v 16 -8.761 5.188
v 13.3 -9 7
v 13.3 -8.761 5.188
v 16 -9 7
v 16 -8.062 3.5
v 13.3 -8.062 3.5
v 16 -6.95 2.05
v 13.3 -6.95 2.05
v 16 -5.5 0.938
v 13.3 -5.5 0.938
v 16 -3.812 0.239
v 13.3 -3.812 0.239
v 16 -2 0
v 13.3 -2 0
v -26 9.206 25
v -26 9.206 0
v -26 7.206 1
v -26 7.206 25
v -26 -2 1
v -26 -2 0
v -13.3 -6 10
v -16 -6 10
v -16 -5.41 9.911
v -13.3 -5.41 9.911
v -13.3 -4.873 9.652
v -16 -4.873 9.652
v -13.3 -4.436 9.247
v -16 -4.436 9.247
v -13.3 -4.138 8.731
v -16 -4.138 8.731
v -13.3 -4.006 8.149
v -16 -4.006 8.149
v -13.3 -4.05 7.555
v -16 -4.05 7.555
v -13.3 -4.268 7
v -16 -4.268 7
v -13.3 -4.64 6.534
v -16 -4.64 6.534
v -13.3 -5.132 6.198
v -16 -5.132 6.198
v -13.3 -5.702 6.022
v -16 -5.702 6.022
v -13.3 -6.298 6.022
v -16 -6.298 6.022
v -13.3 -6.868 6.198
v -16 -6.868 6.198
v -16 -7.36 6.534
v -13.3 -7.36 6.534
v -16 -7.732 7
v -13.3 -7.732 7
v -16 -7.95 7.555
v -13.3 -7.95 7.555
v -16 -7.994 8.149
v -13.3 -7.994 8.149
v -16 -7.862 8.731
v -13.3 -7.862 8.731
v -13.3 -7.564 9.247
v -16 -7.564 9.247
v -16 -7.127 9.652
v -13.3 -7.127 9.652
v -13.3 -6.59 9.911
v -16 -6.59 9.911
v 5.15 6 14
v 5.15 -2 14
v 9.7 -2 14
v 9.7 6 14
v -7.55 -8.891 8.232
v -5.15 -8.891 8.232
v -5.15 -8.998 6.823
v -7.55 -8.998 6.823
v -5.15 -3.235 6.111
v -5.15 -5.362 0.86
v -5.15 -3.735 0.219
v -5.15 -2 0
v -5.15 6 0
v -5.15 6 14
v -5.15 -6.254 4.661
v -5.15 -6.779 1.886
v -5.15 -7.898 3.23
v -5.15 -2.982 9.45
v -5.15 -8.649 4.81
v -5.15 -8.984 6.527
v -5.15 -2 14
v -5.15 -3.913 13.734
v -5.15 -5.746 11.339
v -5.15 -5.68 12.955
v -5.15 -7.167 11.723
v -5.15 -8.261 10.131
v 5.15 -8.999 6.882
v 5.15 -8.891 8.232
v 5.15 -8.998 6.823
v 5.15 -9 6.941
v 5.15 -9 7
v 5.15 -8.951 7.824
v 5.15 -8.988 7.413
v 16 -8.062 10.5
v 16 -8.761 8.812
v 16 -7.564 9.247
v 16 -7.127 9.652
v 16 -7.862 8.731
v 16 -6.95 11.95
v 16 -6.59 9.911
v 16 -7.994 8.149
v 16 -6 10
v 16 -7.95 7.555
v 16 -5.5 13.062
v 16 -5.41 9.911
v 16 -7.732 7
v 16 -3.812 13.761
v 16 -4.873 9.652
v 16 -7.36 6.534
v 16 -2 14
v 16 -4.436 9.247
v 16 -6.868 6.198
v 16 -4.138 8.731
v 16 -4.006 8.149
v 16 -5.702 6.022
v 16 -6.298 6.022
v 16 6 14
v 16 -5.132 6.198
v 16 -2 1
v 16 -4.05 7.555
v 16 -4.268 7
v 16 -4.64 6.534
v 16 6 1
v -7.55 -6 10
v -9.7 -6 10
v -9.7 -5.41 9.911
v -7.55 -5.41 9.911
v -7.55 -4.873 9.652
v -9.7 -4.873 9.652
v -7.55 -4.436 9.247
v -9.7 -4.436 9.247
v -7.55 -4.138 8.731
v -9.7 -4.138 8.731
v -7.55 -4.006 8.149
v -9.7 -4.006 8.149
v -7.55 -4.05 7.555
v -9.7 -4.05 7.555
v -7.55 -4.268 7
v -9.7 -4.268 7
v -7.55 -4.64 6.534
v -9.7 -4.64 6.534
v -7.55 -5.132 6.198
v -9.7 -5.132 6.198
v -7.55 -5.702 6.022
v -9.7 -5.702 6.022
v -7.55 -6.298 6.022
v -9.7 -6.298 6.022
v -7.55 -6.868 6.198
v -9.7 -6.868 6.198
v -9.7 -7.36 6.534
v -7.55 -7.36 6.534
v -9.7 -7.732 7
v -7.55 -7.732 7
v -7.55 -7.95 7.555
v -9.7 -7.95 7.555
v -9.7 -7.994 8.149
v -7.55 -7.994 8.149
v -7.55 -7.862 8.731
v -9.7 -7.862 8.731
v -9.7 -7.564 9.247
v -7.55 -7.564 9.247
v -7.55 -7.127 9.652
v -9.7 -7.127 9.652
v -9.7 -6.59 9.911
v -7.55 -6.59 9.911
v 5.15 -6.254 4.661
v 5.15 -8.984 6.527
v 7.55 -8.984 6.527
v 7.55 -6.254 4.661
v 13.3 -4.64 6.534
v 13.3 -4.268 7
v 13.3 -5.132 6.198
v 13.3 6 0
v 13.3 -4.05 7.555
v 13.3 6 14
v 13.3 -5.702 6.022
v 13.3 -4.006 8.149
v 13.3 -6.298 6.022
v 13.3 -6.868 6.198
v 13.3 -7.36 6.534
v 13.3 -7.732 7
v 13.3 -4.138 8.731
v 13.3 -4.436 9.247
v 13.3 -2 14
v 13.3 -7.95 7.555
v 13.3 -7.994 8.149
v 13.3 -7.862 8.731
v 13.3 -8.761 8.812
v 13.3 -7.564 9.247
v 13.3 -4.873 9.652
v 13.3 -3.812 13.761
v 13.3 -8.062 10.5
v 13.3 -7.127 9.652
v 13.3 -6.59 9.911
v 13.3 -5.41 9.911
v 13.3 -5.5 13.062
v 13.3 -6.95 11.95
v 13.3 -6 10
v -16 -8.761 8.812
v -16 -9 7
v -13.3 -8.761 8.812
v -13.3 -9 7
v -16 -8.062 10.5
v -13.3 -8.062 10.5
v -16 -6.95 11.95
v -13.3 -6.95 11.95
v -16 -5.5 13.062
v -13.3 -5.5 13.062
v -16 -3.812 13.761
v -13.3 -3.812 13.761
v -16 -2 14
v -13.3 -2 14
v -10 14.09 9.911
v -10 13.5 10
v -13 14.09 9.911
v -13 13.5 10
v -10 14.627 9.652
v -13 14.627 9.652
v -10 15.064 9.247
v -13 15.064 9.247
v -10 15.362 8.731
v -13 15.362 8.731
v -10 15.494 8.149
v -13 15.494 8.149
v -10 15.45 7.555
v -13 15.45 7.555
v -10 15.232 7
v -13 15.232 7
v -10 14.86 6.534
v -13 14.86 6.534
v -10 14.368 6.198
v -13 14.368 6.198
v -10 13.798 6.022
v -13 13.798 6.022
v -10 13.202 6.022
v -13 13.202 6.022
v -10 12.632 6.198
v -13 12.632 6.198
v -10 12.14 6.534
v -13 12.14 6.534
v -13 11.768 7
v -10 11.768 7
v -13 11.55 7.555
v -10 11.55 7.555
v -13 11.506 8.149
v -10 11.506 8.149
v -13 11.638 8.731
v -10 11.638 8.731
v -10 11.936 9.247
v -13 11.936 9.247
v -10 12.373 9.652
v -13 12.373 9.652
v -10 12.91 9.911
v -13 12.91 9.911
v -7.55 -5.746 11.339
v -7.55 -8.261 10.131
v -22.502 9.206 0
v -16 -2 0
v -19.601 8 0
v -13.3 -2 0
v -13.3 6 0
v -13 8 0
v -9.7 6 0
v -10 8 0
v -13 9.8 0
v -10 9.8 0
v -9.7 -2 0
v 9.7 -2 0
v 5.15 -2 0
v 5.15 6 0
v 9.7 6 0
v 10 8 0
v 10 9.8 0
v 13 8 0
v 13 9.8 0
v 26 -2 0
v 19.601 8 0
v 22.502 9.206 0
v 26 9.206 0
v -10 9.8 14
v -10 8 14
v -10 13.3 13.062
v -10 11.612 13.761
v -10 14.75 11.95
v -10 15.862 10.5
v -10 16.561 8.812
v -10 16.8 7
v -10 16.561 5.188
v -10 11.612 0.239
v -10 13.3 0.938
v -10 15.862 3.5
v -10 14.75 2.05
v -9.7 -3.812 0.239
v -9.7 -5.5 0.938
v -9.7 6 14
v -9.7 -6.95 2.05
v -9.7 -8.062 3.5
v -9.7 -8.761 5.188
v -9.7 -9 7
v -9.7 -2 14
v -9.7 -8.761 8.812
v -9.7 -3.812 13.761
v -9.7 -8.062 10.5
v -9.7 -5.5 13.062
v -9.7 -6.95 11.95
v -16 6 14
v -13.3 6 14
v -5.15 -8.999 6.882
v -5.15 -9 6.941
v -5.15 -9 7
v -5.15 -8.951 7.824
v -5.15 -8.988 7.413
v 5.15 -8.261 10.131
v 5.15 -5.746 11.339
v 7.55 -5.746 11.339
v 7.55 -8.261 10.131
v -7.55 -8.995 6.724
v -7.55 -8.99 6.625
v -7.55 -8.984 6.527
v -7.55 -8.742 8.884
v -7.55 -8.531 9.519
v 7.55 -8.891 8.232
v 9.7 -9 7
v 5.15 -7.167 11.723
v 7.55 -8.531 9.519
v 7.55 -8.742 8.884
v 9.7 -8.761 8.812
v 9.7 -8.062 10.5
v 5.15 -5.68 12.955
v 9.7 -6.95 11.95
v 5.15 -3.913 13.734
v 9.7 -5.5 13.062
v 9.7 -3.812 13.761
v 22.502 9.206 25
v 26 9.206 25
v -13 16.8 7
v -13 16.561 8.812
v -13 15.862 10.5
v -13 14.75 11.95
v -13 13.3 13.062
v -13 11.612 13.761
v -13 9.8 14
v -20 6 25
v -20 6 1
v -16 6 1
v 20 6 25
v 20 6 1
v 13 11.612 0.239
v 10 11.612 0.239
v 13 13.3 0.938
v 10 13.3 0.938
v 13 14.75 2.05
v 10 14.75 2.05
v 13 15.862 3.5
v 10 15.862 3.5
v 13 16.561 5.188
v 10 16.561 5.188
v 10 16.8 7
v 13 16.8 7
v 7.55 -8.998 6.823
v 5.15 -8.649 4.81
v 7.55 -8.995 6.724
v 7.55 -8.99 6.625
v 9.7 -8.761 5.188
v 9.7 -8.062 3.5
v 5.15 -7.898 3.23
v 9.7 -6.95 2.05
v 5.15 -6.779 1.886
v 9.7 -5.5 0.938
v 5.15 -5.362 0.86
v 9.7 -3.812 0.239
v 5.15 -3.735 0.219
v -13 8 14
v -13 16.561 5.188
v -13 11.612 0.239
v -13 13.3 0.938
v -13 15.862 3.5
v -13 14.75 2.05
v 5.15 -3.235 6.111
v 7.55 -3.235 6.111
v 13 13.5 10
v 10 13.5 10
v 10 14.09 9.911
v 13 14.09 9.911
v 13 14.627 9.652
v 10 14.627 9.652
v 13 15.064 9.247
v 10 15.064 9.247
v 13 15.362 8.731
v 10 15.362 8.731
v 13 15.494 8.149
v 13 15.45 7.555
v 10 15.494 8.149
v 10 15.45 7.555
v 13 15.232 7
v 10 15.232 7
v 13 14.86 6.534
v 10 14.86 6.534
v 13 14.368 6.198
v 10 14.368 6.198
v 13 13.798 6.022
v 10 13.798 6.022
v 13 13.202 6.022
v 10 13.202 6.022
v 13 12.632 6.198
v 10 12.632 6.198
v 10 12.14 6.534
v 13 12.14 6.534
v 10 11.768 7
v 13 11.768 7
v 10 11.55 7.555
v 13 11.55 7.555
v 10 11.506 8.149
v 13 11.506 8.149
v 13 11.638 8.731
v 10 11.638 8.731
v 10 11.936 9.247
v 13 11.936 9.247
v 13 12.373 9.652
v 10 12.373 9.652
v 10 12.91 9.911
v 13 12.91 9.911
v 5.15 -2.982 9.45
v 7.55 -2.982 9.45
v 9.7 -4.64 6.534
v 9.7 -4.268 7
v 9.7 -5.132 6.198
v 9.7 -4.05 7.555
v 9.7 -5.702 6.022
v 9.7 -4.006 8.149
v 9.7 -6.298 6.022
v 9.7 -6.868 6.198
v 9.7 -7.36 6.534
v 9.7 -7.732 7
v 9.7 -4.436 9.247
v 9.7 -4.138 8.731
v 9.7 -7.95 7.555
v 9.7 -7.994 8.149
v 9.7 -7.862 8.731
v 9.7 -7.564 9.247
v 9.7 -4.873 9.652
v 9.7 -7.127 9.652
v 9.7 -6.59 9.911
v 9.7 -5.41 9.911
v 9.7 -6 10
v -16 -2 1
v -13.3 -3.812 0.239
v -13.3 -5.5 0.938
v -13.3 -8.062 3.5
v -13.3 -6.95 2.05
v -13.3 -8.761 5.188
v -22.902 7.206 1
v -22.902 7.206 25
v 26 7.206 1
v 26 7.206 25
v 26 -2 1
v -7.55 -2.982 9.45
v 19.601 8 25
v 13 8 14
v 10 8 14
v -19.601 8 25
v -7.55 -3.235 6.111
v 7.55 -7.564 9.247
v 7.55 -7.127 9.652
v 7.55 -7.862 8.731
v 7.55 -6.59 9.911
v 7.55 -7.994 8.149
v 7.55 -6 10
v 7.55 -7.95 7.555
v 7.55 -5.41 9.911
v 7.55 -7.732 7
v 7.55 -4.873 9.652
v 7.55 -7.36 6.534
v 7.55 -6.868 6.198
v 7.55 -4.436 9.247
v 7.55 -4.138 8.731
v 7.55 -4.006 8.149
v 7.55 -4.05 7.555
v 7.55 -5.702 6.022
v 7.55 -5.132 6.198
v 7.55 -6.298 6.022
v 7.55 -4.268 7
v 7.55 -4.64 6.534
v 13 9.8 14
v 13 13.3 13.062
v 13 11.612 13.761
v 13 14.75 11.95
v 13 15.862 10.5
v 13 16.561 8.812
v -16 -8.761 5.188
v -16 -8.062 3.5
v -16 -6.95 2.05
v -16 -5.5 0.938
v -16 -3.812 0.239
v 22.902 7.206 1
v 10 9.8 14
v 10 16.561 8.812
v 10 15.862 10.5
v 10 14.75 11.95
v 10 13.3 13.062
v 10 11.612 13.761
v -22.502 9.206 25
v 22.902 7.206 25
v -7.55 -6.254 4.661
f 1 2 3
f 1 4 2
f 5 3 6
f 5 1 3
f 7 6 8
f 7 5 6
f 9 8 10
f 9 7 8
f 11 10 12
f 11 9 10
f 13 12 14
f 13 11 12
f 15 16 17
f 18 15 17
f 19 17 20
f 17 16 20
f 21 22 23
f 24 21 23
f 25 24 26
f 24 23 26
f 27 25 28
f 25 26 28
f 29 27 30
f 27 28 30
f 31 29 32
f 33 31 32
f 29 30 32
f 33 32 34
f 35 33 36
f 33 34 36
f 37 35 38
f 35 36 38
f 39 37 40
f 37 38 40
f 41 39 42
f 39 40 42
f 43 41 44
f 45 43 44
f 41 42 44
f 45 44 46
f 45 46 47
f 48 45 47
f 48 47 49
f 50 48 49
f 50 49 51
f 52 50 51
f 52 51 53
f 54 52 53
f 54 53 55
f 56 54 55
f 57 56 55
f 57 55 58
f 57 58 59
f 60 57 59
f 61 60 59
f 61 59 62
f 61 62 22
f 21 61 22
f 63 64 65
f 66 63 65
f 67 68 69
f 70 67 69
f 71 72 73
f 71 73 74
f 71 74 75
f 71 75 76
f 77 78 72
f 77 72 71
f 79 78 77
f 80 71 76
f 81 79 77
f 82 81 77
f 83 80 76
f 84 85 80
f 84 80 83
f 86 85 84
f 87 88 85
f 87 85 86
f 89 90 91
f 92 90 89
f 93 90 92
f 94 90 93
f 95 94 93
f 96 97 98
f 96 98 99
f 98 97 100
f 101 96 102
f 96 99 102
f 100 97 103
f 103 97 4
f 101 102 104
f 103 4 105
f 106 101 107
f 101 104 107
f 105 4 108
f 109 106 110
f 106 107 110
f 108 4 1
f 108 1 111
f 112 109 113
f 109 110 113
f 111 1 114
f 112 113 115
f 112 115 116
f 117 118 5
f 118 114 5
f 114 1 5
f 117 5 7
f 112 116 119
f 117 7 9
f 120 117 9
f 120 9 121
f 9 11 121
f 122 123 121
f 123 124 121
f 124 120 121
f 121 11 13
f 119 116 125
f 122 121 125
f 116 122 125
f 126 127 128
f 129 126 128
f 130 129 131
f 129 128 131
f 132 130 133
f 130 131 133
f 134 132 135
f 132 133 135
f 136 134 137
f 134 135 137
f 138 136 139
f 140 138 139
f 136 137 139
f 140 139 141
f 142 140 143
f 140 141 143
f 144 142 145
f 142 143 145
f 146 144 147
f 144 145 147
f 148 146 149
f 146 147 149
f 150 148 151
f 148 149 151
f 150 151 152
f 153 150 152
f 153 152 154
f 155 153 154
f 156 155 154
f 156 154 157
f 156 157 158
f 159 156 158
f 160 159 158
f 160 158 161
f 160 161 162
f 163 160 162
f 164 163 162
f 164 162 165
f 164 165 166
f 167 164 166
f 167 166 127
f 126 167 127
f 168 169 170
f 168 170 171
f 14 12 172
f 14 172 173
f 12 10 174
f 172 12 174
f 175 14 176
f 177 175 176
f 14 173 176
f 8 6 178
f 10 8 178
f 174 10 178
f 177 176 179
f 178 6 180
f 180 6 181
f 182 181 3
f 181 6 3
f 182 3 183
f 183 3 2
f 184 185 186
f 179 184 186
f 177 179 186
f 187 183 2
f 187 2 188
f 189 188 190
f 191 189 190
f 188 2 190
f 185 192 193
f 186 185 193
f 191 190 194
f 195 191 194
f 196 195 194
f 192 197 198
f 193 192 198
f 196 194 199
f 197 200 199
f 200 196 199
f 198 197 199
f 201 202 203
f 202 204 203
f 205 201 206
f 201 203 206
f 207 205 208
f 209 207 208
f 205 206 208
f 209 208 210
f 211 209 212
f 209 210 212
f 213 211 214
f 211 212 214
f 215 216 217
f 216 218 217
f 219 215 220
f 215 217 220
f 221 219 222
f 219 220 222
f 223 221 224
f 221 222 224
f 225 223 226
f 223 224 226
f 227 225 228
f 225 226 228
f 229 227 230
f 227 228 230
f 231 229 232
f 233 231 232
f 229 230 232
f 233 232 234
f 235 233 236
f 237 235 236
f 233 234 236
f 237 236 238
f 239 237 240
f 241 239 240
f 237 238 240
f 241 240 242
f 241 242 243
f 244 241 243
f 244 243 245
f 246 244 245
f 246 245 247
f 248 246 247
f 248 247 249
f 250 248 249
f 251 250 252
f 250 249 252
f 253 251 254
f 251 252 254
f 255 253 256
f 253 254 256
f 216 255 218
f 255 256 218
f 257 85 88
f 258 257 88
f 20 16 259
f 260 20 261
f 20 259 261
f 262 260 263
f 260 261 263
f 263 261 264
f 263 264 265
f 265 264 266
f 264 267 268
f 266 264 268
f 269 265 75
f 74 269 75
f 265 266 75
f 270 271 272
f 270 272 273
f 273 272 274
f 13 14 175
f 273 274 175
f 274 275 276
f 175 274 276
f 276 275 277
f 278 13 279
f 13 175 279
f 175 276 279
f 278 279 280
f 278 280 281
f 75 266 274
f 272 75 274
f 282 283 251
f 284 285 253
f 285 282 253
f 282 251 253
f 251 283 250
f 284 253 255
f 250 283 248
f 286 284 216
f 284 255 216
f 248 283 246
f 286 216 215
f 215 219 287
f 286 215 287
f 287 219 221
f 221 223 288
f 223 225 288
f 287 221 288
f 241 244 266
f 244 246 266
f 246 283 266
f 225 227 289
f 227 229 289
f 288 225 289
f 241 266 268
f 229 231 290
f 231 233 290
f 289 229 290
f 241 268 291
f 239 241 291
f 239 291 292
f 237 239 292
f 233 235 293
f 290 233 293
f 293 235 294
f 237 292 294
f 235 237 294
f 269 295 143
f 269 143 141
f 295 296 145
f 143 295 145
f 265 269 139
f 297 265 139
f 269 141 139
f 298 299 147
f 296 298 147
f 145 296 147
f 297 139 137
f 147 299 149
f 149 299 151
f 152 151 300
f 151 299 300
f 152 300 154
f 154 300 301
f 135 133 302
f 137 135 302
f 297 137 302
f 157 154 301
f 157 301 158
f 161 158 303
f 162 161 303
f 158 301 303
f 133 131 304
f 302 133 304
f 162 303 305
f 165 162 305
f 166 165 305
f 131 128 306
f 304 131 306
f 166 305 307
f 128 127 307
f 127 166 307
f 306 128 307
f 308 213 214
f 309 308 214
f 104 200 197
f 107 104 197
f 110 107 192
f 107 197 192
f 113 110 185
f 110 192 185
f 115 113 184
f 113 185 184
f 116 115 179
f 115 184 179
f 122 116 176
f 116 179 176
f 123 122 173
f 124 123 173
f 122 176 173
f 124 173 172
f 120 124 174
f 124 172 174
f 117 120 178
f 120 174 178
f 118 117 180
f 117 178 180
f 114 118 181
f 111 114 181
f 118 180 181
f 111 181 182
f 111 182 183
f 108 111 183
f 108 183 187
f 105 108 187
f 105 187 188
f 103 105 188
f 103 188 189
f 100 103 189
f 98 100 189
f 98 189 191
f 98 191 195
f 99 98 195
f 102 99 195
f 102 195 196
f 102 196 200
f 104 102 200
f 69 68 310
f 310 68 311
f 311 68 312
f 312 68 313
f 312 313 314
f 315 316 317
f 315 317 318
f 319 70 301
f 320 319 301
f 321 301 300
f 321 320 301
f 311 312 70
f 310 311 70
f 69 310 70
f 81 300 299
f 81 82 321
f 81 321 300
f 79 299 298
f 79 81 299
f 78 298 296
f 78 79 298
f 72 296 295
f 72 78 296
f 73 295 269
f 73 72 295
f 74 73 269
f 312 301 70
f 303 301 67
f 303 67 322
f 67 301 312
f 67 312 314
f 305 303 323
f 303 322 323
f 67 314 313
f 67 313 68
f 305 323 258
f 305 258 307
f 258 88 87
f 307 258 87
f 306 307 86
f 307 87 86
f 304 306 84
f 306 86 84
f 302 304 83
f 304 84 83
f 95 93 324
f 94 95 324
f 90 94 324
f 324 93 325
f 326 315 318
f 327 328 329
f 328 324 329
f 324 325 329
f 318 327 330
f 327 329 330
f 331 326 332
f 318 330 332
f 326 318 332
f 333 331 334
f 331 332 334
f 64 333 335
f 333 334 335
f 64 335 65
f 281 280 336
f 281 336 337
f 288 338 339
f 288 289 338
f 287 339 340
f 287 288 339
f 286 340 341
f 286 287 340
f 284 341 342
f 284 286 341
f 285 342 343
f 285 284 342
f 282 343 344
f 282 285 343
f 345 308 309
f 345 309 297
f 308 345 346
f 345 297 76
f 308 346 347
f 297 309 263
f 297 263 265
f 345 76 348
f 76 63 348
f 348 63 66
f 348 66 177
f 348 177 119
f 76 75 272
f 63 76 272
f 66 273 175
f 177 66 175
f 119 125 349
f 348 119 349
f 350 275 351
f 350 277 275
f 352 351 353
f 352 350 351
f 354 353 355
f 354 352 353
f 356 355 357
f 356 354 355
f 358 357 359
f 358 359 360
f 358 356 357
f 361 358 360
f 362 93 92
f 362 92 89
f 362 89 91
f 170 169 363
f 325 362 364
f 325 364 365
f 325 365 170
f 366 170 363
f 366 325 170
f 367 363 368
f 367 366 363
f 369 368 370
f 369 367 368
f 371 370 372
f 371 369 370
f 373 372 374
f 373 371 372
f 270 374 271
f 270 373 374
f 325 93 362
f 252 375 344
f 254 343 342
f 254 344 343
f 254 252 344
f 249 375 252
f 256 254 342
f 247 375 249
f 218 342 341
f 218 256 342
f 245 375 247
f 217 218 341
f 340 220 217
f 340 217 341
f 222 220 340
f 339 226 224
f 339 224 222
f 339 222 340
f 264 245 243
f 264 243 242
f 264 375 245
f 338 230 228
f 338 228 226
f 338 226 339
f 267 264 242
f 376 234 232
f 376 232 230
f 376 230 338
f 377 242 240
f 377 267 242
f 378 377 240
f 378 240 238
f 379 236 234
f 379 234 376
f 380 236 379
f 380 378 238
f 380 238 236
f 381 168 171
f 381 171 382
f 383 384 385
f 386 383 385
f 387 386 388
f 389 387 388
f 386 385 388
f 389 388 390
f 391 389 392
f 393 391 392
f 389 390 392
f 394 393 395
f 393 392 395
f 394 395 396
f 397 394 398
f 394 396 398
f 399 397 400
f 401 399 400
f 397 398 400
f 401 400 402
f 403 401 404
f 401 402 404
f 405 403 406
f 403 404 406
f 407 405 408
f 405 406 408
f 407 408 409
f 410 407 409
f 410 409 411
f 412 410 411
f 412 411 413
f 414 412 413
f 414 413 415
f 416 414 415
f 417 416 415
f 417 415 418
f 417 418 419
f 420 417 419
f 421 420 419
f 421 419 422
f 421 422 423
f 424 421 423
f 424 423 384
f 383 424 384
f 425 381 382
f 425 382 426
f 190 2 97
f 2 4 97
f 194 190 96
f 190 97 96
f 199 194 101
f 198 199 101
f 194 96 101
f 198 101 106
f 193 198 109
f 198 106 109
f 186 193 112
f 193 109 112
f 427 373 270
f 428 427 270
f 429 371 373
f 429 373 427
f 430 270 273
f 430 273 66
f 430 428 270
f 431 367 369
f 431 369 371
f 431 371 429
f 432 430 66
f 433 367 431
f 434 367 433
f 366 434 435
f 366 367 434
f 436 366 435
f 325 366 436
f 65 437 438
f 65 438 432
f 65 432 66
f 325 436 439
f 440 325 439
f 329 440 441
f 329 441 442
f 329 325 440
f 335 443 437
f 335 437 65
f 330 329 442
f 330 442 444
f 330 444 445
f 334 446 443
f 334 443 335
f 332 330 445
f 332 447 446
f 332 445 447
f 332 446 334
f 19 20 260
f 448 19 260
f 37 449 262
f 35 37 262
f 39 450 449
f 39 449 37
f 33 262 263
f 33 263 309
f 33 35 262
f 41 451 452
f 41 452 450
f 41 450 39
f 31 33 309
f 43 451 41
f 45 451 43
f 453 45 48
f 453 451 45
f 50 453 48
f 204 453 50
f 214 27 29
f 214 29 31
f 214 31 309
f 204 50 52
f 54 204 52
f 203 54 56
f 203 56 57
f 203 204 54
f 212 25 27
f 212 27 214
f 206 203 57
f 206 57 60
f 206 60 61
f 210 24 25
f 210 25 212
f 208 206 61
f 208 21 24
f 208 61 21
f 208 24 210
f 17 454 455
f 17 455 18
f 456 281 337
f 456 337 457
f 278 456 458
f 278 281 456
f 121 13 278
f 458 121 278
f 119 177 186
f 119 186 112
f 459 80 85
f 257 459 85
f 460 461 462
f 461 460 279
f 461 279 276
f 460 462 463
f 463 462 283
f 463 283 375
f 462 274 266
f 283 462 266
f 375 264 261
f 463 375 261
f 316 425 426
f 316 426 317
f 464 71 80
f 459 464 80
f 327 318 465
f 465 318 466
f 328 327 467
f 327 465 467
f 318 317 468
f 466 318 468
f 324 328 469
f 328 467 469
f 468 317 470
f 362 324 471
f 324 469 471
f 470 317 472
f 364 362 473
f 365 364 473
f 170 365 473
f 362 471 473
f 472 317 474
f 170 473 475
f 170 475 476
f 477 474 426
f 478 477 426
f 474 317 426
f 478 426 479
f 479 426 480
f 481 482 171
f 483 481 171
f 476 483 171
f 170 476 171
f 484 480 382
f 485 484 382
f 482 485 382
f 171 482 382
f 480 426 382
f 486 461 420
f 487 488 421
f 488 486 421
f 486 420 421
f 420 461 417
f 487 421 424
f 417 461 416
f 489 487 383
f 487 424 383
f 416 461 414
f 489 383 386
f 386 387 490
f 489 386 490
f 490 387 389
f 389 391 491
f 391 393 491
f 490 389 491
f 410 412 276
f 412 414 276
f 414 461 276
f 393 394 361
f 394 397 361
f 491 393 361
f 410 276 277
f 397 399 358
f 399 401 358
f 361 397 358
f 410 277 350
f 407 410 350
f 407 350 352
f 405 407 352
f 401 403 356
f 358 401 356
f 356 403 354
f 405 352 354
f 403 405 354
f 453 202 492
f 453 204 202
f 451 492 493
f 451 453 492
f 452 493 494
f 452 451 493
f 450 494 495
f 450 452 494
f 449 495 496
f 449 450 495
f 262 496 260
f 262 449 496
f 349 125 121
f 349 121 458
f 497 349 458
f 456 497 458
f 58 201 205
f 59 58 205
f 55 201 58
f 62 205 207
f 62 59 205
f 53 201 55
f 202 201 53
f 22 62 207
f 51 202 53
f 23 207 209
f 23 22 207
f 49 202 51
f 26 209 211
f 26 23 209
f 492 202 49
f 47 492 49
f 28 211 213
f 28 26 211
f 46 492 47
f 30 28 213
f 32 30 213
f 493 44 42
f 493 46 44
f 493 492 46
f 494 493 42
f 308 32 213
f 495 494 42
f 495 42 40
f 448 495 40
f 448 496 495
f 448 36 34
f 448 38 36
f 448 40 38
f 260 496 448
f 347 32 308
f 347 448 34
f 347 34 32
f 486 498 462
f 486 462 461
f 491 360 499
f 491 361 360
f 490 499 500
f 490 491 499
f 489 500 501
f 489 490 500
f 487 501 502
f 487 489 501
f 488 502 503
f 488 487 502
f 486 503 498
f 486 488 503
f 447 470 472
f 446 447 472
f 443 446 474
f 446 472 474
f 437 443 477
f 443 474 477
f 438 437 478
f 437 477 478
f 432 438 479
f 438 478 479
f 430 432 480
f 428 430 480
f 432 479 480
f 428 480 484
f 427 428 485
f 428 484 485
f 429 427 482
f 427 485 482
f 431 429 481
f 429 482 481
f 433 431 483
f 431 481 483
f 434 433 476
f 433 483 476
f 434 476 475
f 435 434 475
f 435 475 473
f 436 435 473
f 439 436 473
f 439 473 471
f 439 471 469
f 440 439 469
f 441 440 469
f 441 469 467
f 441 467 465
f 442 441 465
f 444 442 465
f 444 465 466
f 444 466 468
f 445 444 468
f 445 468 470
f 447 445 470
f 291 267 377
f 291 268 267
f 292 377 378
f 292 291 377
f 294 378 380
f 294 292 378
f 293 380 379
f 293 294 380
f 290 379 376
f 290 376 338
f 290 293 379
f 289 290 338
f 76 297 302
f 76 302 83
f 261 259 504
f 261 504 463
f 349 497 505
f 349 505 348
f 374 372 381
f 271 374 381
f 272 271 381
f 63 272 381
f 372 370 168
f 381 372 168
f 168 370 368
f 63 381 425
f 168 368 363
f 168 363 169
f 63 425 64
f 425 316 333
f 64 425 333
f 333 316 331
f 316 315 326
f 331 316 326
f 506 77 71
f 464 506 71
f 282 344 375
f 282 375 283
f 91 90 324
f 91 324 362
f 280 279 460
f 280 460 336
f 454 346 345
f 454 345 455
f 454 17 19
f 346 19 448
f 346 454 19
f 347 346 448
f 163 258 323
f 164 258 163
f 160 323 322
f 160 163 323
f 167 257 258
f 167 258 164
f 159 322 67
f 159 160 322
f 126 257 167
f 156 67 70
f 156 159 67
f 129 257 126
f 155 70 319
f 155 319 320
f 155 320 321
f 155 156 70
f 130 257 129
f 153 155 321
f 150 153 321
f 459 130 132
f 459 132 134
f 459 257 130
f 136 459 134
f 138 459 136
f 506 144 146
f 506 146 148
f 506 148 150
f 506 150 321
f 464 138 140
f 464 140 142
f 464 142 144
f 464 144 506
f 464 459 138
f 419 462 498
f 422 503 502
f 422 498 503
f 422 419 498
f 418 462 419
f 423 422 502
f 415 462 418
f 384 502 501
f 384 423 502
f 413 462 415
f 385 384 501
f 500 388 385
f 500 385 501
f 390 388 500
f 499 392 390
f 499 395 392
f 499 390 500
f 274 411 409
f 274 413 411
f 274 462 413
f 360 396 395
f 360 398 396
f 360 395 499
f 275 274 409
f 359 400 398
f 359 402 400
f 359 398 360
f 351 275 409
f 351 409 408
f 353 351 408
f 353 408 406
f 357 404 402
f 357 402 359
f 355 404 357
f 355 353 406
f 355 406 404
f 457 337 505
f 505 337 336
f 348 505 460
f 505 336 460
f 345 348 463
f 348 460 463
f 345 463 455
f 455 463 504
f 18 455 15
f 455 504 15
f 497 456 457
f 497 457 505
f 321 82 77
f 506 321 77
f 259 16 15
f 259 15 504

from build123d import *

# Parameters (mm, degrees)
SKETCH2_W                 = 5
SKETCH2_H                 = 15
BOSS_EXTRUDE1_DEPTH       = 14
BOSS_EXTRUDE1_2_DEPTH     = 14
BOSS_EXTRUDE3_DEPTH       = 25
SKETCH5_W                 = 3
SKETCH5_H                 = 8.8
BOSS_EXTRUDE4_DEPTH       = 14
SKETCH7_W                 = 3
SKETCH7_H                 = 15
BOSS_EXTRUDE5_DEPTH       = 14
SKETCH15_W                = 0.3
SKETCH15_H                = 14
CUT_EXTRUDE2_DEPTH        = 15
SKETCH16_W                = 0.15
SKETCH16_H                = 14
CUT_EXTRUDE3_DEPTH        = 15
FILLET1_R                 = 7
F_4_0MM_DOWEL_HOLE2_D     = 4
FILLET2_R                 = 7
F_4_0MM_DOWEL_HOLE1_D     = 4
F_4_0MM_DOWEL_HOLE1_DEPTH = 26
F_4_0MM_DOWEL_HOLE1_TIP   = 1.201721238
BOSS_EXTRUDE6_DEPTH       = 1
CUT_EXTRUDE4_DEPTH        = 2.4


with BuildPart() as part:
    # Sketch2 → Boss-Extrude1 (new body)
    with BuildSketch(Plane.XY):
        with Locations((-7.5, -1.5)):
            Rectangle(SKETCH2_W, SKETCH2_H)
    extrude(amount=BOSS_EXTRUDE1_DEPTH)



with BuildPart() as body_2:
    # Sketch2 → Boss-Extrude1 2 (new body)
    with BuildSketch(Plane.XY):
        with Locations((7.5, -1.5)):
            Rectangle(SKETCH2_W, SKETCH2_H)
    extrude(amount=BOSS_EXTRUDE1_2_DEPTH)


with BuildPart() as part_1:
    add(part.part)

    add(body_2.part)  # Boss-Extrude3 merges body 2
    # Sketch4 → Boss-Extrude3 (add)
    with BuildSketch(Plane.XY):
        Polygon((-10, 6), (-20, 6), (-22.901603942, 7.206366686), (-26, 7.206366686), (-26, 9.206366686), (-22.502408858, 9.206366686), (-19.600804916, 8), (-10, 8), (10, 8), (19.600804916, 8), (22.502408858, 9.206366686), (26, 9.206366686), (26, 7.206366686), (22.901603942, 7.206366686), (20, 6), (10, 6), align=None)
    extrude(amount=BOSS_EXTRUDE3_DEPTH)

    # Sketch5 → Boss-Extrude4 (add)
    with BuildSketch(Plane.XY):
        with Locations((-11.5, 12.4)):
            Rectangle(SKETCH5_W, SKETCH5_H)
        with Locations((11.5, 12.4)):
            Rectangle(SKETCH5_W, SKETCH5_H)
    extrude(amount=BOSS_EXTRUDE4_DEPTH)

    # Sketch7 → Boss-Extrude5 (add)
    with BuildSketch(Plane.XY):
        with Locations((-14.5, -1.5)):
            Rectangle(SKETCH7_W, SKETCH7_H)
        with Locations((14.5, -1.5)):
            Rectangle(SKETCH7_W, SKETCH7_H)
    extrude(amount=BOSS_EXTRUDE5_DEPTH)

    # Sketch15 → Cut-Extrude2 (cut)
    with BuildSketch(Plane.XZ.offset(9)):
        with Locations((-9.85, 7)):
            Rectangle(SKETCH15_W, SKETCH15_H)
        with Locations((9.85, 7)):
            Rectangle(SKETCH15_W, SKETCH15_H)
        with Locations((-13.15, 7)):
            Rectangle(SKETCH15_W, SKETCH15_H)
        with Locations((13.15, 7)):
            Rectangle(SKETCH15_W, SKETCH15_H)
    extrude(amount=-CUT_EXTRUDE2_DEPTH, mode=Mode.SUBTRACT)

    # Sketch16 → Cut-Extrude3 (cut)
    with BuildSketch(Plane.XZ.offset(9)):
        with Locations((-5.075, 7)):
            Rectangle(SKETCH16_W, SKETCH16_H)
        with Locations((5.075, 7)):
            Rectangle(SKETCH16_W, SKETCH16_H)
    extrude(amount=-CUT_EXTRUDE3_DEPTH, mode=Mode.SUBTRACT)

    # Fillet1
    fillet1_edges = [part_1.edges().sort_by_distance(p)[0] for p in [
        (7.425, -9, 0),
        (7.425, -9, 14),
        (-7.425, -9, 0),
        (-7.425, -9, 14),
        (-14.65, -9, 0),
        (-14.65, -9, 14),
        (14.65, -9, 14),
        (14.65, -9, 0),
    ]]
    fillet(fillet1_edges, radius=FILLET1_R - 0.0001)  # a hair under: the kernel refuses the full size

    # Ø4.0mm Dowel Hole2 (through all)
    with Locations(Plane(origin=(16, 0, 0), x_dir=(0, 0, -1), z_dir=(1, 0, 0))):
        with Locations((-8, -6)):
            Hole(F_4_0MM_DOWEL_HOLE2_D / 2)

    # Fillet2
    fillet2_edges = [part_1.edges().sort_by_distance(p)[0] for p in [
        (-11.5, 16.8, 0),
        (-11.5, 16.8, 14),
        (11.5, 16.8, 0),
        (11.5, 16.8, 14),
    ]]
    fillet(fillet2_edges, radius=FILLET2_R - 0.0001)  # a hair under: the kernel refuses the full size

    # Ø4.0mm Dowel Hole1
    with Locations(Plane(origin=(13, 0, 0), x_dir=(0, 0, -1), z_dir=(1, 0, 0))):
        with Locations((-8, 13.5)):
            Hole(F_4_0MM_DOWEL_HOLE1_D / 2, depth=F_4_0MM_DOWEL_HOLE1_DEPTH)
            with Locations((0, 0, -(F_4_0MM_DOWEL_HOLE1_DEPTH + F_4_0MM_DOWEL_HOLE1_TIP / 2))):  # 118° drill point
                Cone(0, F_4_0MM_DOWEL_HOLE1_D / 2, F_4_0MM_DOWEL_HOLE1_TIP, mode=Mode.SUBTRACT)

    # Sketch14 → Boss-Extrude6 (add)
    with BuildSketch(Plane.XY):
        Polygon((-22.901603942, 7.206366686), (-26, 7.206366686), (-26, -2), (-16, -2), (-16, 6), (-20, 6), align=None)
        Polygon((20, 6), (16, 6), (16, -2), (26, -2), (26, 7.206366686), (22.901603942, 7.206366686), align=None)
    extrude(amount=BOSS_EXTRUDE6_DEPTH)

    # Sketch18 → Cut-Extrude4 (cut)
    with BuildSketch(Plane(origin=(-5.15, 0, 0), x_dir=(0, 0, -1), z_dir=(1, 0, 0))):
        Polygon((-6.110899152, -3.235107358), (-9.449916842, -2.981544355), (-11.33901769, -5.746436996), (-9.889100848, -8.764892642), (-6.550083158, -9.018455645), (-4.66098231, -6.253563004), align=None)
    cut_extrude4 = extrude(amount=-CUT_EXTRUDE4_DEPTH, mode=Mode.SUBTRACT)

    # Mirror1: Cut-Extrude4 across plane
    add(cut_extrude4.mirror(Plane(origin=(0, 0, 0), x_dir=(0, 0, 1), z_dir=(1, 0, 0))), mode=Mode.SUBTRACT)


solid = part_1.part
